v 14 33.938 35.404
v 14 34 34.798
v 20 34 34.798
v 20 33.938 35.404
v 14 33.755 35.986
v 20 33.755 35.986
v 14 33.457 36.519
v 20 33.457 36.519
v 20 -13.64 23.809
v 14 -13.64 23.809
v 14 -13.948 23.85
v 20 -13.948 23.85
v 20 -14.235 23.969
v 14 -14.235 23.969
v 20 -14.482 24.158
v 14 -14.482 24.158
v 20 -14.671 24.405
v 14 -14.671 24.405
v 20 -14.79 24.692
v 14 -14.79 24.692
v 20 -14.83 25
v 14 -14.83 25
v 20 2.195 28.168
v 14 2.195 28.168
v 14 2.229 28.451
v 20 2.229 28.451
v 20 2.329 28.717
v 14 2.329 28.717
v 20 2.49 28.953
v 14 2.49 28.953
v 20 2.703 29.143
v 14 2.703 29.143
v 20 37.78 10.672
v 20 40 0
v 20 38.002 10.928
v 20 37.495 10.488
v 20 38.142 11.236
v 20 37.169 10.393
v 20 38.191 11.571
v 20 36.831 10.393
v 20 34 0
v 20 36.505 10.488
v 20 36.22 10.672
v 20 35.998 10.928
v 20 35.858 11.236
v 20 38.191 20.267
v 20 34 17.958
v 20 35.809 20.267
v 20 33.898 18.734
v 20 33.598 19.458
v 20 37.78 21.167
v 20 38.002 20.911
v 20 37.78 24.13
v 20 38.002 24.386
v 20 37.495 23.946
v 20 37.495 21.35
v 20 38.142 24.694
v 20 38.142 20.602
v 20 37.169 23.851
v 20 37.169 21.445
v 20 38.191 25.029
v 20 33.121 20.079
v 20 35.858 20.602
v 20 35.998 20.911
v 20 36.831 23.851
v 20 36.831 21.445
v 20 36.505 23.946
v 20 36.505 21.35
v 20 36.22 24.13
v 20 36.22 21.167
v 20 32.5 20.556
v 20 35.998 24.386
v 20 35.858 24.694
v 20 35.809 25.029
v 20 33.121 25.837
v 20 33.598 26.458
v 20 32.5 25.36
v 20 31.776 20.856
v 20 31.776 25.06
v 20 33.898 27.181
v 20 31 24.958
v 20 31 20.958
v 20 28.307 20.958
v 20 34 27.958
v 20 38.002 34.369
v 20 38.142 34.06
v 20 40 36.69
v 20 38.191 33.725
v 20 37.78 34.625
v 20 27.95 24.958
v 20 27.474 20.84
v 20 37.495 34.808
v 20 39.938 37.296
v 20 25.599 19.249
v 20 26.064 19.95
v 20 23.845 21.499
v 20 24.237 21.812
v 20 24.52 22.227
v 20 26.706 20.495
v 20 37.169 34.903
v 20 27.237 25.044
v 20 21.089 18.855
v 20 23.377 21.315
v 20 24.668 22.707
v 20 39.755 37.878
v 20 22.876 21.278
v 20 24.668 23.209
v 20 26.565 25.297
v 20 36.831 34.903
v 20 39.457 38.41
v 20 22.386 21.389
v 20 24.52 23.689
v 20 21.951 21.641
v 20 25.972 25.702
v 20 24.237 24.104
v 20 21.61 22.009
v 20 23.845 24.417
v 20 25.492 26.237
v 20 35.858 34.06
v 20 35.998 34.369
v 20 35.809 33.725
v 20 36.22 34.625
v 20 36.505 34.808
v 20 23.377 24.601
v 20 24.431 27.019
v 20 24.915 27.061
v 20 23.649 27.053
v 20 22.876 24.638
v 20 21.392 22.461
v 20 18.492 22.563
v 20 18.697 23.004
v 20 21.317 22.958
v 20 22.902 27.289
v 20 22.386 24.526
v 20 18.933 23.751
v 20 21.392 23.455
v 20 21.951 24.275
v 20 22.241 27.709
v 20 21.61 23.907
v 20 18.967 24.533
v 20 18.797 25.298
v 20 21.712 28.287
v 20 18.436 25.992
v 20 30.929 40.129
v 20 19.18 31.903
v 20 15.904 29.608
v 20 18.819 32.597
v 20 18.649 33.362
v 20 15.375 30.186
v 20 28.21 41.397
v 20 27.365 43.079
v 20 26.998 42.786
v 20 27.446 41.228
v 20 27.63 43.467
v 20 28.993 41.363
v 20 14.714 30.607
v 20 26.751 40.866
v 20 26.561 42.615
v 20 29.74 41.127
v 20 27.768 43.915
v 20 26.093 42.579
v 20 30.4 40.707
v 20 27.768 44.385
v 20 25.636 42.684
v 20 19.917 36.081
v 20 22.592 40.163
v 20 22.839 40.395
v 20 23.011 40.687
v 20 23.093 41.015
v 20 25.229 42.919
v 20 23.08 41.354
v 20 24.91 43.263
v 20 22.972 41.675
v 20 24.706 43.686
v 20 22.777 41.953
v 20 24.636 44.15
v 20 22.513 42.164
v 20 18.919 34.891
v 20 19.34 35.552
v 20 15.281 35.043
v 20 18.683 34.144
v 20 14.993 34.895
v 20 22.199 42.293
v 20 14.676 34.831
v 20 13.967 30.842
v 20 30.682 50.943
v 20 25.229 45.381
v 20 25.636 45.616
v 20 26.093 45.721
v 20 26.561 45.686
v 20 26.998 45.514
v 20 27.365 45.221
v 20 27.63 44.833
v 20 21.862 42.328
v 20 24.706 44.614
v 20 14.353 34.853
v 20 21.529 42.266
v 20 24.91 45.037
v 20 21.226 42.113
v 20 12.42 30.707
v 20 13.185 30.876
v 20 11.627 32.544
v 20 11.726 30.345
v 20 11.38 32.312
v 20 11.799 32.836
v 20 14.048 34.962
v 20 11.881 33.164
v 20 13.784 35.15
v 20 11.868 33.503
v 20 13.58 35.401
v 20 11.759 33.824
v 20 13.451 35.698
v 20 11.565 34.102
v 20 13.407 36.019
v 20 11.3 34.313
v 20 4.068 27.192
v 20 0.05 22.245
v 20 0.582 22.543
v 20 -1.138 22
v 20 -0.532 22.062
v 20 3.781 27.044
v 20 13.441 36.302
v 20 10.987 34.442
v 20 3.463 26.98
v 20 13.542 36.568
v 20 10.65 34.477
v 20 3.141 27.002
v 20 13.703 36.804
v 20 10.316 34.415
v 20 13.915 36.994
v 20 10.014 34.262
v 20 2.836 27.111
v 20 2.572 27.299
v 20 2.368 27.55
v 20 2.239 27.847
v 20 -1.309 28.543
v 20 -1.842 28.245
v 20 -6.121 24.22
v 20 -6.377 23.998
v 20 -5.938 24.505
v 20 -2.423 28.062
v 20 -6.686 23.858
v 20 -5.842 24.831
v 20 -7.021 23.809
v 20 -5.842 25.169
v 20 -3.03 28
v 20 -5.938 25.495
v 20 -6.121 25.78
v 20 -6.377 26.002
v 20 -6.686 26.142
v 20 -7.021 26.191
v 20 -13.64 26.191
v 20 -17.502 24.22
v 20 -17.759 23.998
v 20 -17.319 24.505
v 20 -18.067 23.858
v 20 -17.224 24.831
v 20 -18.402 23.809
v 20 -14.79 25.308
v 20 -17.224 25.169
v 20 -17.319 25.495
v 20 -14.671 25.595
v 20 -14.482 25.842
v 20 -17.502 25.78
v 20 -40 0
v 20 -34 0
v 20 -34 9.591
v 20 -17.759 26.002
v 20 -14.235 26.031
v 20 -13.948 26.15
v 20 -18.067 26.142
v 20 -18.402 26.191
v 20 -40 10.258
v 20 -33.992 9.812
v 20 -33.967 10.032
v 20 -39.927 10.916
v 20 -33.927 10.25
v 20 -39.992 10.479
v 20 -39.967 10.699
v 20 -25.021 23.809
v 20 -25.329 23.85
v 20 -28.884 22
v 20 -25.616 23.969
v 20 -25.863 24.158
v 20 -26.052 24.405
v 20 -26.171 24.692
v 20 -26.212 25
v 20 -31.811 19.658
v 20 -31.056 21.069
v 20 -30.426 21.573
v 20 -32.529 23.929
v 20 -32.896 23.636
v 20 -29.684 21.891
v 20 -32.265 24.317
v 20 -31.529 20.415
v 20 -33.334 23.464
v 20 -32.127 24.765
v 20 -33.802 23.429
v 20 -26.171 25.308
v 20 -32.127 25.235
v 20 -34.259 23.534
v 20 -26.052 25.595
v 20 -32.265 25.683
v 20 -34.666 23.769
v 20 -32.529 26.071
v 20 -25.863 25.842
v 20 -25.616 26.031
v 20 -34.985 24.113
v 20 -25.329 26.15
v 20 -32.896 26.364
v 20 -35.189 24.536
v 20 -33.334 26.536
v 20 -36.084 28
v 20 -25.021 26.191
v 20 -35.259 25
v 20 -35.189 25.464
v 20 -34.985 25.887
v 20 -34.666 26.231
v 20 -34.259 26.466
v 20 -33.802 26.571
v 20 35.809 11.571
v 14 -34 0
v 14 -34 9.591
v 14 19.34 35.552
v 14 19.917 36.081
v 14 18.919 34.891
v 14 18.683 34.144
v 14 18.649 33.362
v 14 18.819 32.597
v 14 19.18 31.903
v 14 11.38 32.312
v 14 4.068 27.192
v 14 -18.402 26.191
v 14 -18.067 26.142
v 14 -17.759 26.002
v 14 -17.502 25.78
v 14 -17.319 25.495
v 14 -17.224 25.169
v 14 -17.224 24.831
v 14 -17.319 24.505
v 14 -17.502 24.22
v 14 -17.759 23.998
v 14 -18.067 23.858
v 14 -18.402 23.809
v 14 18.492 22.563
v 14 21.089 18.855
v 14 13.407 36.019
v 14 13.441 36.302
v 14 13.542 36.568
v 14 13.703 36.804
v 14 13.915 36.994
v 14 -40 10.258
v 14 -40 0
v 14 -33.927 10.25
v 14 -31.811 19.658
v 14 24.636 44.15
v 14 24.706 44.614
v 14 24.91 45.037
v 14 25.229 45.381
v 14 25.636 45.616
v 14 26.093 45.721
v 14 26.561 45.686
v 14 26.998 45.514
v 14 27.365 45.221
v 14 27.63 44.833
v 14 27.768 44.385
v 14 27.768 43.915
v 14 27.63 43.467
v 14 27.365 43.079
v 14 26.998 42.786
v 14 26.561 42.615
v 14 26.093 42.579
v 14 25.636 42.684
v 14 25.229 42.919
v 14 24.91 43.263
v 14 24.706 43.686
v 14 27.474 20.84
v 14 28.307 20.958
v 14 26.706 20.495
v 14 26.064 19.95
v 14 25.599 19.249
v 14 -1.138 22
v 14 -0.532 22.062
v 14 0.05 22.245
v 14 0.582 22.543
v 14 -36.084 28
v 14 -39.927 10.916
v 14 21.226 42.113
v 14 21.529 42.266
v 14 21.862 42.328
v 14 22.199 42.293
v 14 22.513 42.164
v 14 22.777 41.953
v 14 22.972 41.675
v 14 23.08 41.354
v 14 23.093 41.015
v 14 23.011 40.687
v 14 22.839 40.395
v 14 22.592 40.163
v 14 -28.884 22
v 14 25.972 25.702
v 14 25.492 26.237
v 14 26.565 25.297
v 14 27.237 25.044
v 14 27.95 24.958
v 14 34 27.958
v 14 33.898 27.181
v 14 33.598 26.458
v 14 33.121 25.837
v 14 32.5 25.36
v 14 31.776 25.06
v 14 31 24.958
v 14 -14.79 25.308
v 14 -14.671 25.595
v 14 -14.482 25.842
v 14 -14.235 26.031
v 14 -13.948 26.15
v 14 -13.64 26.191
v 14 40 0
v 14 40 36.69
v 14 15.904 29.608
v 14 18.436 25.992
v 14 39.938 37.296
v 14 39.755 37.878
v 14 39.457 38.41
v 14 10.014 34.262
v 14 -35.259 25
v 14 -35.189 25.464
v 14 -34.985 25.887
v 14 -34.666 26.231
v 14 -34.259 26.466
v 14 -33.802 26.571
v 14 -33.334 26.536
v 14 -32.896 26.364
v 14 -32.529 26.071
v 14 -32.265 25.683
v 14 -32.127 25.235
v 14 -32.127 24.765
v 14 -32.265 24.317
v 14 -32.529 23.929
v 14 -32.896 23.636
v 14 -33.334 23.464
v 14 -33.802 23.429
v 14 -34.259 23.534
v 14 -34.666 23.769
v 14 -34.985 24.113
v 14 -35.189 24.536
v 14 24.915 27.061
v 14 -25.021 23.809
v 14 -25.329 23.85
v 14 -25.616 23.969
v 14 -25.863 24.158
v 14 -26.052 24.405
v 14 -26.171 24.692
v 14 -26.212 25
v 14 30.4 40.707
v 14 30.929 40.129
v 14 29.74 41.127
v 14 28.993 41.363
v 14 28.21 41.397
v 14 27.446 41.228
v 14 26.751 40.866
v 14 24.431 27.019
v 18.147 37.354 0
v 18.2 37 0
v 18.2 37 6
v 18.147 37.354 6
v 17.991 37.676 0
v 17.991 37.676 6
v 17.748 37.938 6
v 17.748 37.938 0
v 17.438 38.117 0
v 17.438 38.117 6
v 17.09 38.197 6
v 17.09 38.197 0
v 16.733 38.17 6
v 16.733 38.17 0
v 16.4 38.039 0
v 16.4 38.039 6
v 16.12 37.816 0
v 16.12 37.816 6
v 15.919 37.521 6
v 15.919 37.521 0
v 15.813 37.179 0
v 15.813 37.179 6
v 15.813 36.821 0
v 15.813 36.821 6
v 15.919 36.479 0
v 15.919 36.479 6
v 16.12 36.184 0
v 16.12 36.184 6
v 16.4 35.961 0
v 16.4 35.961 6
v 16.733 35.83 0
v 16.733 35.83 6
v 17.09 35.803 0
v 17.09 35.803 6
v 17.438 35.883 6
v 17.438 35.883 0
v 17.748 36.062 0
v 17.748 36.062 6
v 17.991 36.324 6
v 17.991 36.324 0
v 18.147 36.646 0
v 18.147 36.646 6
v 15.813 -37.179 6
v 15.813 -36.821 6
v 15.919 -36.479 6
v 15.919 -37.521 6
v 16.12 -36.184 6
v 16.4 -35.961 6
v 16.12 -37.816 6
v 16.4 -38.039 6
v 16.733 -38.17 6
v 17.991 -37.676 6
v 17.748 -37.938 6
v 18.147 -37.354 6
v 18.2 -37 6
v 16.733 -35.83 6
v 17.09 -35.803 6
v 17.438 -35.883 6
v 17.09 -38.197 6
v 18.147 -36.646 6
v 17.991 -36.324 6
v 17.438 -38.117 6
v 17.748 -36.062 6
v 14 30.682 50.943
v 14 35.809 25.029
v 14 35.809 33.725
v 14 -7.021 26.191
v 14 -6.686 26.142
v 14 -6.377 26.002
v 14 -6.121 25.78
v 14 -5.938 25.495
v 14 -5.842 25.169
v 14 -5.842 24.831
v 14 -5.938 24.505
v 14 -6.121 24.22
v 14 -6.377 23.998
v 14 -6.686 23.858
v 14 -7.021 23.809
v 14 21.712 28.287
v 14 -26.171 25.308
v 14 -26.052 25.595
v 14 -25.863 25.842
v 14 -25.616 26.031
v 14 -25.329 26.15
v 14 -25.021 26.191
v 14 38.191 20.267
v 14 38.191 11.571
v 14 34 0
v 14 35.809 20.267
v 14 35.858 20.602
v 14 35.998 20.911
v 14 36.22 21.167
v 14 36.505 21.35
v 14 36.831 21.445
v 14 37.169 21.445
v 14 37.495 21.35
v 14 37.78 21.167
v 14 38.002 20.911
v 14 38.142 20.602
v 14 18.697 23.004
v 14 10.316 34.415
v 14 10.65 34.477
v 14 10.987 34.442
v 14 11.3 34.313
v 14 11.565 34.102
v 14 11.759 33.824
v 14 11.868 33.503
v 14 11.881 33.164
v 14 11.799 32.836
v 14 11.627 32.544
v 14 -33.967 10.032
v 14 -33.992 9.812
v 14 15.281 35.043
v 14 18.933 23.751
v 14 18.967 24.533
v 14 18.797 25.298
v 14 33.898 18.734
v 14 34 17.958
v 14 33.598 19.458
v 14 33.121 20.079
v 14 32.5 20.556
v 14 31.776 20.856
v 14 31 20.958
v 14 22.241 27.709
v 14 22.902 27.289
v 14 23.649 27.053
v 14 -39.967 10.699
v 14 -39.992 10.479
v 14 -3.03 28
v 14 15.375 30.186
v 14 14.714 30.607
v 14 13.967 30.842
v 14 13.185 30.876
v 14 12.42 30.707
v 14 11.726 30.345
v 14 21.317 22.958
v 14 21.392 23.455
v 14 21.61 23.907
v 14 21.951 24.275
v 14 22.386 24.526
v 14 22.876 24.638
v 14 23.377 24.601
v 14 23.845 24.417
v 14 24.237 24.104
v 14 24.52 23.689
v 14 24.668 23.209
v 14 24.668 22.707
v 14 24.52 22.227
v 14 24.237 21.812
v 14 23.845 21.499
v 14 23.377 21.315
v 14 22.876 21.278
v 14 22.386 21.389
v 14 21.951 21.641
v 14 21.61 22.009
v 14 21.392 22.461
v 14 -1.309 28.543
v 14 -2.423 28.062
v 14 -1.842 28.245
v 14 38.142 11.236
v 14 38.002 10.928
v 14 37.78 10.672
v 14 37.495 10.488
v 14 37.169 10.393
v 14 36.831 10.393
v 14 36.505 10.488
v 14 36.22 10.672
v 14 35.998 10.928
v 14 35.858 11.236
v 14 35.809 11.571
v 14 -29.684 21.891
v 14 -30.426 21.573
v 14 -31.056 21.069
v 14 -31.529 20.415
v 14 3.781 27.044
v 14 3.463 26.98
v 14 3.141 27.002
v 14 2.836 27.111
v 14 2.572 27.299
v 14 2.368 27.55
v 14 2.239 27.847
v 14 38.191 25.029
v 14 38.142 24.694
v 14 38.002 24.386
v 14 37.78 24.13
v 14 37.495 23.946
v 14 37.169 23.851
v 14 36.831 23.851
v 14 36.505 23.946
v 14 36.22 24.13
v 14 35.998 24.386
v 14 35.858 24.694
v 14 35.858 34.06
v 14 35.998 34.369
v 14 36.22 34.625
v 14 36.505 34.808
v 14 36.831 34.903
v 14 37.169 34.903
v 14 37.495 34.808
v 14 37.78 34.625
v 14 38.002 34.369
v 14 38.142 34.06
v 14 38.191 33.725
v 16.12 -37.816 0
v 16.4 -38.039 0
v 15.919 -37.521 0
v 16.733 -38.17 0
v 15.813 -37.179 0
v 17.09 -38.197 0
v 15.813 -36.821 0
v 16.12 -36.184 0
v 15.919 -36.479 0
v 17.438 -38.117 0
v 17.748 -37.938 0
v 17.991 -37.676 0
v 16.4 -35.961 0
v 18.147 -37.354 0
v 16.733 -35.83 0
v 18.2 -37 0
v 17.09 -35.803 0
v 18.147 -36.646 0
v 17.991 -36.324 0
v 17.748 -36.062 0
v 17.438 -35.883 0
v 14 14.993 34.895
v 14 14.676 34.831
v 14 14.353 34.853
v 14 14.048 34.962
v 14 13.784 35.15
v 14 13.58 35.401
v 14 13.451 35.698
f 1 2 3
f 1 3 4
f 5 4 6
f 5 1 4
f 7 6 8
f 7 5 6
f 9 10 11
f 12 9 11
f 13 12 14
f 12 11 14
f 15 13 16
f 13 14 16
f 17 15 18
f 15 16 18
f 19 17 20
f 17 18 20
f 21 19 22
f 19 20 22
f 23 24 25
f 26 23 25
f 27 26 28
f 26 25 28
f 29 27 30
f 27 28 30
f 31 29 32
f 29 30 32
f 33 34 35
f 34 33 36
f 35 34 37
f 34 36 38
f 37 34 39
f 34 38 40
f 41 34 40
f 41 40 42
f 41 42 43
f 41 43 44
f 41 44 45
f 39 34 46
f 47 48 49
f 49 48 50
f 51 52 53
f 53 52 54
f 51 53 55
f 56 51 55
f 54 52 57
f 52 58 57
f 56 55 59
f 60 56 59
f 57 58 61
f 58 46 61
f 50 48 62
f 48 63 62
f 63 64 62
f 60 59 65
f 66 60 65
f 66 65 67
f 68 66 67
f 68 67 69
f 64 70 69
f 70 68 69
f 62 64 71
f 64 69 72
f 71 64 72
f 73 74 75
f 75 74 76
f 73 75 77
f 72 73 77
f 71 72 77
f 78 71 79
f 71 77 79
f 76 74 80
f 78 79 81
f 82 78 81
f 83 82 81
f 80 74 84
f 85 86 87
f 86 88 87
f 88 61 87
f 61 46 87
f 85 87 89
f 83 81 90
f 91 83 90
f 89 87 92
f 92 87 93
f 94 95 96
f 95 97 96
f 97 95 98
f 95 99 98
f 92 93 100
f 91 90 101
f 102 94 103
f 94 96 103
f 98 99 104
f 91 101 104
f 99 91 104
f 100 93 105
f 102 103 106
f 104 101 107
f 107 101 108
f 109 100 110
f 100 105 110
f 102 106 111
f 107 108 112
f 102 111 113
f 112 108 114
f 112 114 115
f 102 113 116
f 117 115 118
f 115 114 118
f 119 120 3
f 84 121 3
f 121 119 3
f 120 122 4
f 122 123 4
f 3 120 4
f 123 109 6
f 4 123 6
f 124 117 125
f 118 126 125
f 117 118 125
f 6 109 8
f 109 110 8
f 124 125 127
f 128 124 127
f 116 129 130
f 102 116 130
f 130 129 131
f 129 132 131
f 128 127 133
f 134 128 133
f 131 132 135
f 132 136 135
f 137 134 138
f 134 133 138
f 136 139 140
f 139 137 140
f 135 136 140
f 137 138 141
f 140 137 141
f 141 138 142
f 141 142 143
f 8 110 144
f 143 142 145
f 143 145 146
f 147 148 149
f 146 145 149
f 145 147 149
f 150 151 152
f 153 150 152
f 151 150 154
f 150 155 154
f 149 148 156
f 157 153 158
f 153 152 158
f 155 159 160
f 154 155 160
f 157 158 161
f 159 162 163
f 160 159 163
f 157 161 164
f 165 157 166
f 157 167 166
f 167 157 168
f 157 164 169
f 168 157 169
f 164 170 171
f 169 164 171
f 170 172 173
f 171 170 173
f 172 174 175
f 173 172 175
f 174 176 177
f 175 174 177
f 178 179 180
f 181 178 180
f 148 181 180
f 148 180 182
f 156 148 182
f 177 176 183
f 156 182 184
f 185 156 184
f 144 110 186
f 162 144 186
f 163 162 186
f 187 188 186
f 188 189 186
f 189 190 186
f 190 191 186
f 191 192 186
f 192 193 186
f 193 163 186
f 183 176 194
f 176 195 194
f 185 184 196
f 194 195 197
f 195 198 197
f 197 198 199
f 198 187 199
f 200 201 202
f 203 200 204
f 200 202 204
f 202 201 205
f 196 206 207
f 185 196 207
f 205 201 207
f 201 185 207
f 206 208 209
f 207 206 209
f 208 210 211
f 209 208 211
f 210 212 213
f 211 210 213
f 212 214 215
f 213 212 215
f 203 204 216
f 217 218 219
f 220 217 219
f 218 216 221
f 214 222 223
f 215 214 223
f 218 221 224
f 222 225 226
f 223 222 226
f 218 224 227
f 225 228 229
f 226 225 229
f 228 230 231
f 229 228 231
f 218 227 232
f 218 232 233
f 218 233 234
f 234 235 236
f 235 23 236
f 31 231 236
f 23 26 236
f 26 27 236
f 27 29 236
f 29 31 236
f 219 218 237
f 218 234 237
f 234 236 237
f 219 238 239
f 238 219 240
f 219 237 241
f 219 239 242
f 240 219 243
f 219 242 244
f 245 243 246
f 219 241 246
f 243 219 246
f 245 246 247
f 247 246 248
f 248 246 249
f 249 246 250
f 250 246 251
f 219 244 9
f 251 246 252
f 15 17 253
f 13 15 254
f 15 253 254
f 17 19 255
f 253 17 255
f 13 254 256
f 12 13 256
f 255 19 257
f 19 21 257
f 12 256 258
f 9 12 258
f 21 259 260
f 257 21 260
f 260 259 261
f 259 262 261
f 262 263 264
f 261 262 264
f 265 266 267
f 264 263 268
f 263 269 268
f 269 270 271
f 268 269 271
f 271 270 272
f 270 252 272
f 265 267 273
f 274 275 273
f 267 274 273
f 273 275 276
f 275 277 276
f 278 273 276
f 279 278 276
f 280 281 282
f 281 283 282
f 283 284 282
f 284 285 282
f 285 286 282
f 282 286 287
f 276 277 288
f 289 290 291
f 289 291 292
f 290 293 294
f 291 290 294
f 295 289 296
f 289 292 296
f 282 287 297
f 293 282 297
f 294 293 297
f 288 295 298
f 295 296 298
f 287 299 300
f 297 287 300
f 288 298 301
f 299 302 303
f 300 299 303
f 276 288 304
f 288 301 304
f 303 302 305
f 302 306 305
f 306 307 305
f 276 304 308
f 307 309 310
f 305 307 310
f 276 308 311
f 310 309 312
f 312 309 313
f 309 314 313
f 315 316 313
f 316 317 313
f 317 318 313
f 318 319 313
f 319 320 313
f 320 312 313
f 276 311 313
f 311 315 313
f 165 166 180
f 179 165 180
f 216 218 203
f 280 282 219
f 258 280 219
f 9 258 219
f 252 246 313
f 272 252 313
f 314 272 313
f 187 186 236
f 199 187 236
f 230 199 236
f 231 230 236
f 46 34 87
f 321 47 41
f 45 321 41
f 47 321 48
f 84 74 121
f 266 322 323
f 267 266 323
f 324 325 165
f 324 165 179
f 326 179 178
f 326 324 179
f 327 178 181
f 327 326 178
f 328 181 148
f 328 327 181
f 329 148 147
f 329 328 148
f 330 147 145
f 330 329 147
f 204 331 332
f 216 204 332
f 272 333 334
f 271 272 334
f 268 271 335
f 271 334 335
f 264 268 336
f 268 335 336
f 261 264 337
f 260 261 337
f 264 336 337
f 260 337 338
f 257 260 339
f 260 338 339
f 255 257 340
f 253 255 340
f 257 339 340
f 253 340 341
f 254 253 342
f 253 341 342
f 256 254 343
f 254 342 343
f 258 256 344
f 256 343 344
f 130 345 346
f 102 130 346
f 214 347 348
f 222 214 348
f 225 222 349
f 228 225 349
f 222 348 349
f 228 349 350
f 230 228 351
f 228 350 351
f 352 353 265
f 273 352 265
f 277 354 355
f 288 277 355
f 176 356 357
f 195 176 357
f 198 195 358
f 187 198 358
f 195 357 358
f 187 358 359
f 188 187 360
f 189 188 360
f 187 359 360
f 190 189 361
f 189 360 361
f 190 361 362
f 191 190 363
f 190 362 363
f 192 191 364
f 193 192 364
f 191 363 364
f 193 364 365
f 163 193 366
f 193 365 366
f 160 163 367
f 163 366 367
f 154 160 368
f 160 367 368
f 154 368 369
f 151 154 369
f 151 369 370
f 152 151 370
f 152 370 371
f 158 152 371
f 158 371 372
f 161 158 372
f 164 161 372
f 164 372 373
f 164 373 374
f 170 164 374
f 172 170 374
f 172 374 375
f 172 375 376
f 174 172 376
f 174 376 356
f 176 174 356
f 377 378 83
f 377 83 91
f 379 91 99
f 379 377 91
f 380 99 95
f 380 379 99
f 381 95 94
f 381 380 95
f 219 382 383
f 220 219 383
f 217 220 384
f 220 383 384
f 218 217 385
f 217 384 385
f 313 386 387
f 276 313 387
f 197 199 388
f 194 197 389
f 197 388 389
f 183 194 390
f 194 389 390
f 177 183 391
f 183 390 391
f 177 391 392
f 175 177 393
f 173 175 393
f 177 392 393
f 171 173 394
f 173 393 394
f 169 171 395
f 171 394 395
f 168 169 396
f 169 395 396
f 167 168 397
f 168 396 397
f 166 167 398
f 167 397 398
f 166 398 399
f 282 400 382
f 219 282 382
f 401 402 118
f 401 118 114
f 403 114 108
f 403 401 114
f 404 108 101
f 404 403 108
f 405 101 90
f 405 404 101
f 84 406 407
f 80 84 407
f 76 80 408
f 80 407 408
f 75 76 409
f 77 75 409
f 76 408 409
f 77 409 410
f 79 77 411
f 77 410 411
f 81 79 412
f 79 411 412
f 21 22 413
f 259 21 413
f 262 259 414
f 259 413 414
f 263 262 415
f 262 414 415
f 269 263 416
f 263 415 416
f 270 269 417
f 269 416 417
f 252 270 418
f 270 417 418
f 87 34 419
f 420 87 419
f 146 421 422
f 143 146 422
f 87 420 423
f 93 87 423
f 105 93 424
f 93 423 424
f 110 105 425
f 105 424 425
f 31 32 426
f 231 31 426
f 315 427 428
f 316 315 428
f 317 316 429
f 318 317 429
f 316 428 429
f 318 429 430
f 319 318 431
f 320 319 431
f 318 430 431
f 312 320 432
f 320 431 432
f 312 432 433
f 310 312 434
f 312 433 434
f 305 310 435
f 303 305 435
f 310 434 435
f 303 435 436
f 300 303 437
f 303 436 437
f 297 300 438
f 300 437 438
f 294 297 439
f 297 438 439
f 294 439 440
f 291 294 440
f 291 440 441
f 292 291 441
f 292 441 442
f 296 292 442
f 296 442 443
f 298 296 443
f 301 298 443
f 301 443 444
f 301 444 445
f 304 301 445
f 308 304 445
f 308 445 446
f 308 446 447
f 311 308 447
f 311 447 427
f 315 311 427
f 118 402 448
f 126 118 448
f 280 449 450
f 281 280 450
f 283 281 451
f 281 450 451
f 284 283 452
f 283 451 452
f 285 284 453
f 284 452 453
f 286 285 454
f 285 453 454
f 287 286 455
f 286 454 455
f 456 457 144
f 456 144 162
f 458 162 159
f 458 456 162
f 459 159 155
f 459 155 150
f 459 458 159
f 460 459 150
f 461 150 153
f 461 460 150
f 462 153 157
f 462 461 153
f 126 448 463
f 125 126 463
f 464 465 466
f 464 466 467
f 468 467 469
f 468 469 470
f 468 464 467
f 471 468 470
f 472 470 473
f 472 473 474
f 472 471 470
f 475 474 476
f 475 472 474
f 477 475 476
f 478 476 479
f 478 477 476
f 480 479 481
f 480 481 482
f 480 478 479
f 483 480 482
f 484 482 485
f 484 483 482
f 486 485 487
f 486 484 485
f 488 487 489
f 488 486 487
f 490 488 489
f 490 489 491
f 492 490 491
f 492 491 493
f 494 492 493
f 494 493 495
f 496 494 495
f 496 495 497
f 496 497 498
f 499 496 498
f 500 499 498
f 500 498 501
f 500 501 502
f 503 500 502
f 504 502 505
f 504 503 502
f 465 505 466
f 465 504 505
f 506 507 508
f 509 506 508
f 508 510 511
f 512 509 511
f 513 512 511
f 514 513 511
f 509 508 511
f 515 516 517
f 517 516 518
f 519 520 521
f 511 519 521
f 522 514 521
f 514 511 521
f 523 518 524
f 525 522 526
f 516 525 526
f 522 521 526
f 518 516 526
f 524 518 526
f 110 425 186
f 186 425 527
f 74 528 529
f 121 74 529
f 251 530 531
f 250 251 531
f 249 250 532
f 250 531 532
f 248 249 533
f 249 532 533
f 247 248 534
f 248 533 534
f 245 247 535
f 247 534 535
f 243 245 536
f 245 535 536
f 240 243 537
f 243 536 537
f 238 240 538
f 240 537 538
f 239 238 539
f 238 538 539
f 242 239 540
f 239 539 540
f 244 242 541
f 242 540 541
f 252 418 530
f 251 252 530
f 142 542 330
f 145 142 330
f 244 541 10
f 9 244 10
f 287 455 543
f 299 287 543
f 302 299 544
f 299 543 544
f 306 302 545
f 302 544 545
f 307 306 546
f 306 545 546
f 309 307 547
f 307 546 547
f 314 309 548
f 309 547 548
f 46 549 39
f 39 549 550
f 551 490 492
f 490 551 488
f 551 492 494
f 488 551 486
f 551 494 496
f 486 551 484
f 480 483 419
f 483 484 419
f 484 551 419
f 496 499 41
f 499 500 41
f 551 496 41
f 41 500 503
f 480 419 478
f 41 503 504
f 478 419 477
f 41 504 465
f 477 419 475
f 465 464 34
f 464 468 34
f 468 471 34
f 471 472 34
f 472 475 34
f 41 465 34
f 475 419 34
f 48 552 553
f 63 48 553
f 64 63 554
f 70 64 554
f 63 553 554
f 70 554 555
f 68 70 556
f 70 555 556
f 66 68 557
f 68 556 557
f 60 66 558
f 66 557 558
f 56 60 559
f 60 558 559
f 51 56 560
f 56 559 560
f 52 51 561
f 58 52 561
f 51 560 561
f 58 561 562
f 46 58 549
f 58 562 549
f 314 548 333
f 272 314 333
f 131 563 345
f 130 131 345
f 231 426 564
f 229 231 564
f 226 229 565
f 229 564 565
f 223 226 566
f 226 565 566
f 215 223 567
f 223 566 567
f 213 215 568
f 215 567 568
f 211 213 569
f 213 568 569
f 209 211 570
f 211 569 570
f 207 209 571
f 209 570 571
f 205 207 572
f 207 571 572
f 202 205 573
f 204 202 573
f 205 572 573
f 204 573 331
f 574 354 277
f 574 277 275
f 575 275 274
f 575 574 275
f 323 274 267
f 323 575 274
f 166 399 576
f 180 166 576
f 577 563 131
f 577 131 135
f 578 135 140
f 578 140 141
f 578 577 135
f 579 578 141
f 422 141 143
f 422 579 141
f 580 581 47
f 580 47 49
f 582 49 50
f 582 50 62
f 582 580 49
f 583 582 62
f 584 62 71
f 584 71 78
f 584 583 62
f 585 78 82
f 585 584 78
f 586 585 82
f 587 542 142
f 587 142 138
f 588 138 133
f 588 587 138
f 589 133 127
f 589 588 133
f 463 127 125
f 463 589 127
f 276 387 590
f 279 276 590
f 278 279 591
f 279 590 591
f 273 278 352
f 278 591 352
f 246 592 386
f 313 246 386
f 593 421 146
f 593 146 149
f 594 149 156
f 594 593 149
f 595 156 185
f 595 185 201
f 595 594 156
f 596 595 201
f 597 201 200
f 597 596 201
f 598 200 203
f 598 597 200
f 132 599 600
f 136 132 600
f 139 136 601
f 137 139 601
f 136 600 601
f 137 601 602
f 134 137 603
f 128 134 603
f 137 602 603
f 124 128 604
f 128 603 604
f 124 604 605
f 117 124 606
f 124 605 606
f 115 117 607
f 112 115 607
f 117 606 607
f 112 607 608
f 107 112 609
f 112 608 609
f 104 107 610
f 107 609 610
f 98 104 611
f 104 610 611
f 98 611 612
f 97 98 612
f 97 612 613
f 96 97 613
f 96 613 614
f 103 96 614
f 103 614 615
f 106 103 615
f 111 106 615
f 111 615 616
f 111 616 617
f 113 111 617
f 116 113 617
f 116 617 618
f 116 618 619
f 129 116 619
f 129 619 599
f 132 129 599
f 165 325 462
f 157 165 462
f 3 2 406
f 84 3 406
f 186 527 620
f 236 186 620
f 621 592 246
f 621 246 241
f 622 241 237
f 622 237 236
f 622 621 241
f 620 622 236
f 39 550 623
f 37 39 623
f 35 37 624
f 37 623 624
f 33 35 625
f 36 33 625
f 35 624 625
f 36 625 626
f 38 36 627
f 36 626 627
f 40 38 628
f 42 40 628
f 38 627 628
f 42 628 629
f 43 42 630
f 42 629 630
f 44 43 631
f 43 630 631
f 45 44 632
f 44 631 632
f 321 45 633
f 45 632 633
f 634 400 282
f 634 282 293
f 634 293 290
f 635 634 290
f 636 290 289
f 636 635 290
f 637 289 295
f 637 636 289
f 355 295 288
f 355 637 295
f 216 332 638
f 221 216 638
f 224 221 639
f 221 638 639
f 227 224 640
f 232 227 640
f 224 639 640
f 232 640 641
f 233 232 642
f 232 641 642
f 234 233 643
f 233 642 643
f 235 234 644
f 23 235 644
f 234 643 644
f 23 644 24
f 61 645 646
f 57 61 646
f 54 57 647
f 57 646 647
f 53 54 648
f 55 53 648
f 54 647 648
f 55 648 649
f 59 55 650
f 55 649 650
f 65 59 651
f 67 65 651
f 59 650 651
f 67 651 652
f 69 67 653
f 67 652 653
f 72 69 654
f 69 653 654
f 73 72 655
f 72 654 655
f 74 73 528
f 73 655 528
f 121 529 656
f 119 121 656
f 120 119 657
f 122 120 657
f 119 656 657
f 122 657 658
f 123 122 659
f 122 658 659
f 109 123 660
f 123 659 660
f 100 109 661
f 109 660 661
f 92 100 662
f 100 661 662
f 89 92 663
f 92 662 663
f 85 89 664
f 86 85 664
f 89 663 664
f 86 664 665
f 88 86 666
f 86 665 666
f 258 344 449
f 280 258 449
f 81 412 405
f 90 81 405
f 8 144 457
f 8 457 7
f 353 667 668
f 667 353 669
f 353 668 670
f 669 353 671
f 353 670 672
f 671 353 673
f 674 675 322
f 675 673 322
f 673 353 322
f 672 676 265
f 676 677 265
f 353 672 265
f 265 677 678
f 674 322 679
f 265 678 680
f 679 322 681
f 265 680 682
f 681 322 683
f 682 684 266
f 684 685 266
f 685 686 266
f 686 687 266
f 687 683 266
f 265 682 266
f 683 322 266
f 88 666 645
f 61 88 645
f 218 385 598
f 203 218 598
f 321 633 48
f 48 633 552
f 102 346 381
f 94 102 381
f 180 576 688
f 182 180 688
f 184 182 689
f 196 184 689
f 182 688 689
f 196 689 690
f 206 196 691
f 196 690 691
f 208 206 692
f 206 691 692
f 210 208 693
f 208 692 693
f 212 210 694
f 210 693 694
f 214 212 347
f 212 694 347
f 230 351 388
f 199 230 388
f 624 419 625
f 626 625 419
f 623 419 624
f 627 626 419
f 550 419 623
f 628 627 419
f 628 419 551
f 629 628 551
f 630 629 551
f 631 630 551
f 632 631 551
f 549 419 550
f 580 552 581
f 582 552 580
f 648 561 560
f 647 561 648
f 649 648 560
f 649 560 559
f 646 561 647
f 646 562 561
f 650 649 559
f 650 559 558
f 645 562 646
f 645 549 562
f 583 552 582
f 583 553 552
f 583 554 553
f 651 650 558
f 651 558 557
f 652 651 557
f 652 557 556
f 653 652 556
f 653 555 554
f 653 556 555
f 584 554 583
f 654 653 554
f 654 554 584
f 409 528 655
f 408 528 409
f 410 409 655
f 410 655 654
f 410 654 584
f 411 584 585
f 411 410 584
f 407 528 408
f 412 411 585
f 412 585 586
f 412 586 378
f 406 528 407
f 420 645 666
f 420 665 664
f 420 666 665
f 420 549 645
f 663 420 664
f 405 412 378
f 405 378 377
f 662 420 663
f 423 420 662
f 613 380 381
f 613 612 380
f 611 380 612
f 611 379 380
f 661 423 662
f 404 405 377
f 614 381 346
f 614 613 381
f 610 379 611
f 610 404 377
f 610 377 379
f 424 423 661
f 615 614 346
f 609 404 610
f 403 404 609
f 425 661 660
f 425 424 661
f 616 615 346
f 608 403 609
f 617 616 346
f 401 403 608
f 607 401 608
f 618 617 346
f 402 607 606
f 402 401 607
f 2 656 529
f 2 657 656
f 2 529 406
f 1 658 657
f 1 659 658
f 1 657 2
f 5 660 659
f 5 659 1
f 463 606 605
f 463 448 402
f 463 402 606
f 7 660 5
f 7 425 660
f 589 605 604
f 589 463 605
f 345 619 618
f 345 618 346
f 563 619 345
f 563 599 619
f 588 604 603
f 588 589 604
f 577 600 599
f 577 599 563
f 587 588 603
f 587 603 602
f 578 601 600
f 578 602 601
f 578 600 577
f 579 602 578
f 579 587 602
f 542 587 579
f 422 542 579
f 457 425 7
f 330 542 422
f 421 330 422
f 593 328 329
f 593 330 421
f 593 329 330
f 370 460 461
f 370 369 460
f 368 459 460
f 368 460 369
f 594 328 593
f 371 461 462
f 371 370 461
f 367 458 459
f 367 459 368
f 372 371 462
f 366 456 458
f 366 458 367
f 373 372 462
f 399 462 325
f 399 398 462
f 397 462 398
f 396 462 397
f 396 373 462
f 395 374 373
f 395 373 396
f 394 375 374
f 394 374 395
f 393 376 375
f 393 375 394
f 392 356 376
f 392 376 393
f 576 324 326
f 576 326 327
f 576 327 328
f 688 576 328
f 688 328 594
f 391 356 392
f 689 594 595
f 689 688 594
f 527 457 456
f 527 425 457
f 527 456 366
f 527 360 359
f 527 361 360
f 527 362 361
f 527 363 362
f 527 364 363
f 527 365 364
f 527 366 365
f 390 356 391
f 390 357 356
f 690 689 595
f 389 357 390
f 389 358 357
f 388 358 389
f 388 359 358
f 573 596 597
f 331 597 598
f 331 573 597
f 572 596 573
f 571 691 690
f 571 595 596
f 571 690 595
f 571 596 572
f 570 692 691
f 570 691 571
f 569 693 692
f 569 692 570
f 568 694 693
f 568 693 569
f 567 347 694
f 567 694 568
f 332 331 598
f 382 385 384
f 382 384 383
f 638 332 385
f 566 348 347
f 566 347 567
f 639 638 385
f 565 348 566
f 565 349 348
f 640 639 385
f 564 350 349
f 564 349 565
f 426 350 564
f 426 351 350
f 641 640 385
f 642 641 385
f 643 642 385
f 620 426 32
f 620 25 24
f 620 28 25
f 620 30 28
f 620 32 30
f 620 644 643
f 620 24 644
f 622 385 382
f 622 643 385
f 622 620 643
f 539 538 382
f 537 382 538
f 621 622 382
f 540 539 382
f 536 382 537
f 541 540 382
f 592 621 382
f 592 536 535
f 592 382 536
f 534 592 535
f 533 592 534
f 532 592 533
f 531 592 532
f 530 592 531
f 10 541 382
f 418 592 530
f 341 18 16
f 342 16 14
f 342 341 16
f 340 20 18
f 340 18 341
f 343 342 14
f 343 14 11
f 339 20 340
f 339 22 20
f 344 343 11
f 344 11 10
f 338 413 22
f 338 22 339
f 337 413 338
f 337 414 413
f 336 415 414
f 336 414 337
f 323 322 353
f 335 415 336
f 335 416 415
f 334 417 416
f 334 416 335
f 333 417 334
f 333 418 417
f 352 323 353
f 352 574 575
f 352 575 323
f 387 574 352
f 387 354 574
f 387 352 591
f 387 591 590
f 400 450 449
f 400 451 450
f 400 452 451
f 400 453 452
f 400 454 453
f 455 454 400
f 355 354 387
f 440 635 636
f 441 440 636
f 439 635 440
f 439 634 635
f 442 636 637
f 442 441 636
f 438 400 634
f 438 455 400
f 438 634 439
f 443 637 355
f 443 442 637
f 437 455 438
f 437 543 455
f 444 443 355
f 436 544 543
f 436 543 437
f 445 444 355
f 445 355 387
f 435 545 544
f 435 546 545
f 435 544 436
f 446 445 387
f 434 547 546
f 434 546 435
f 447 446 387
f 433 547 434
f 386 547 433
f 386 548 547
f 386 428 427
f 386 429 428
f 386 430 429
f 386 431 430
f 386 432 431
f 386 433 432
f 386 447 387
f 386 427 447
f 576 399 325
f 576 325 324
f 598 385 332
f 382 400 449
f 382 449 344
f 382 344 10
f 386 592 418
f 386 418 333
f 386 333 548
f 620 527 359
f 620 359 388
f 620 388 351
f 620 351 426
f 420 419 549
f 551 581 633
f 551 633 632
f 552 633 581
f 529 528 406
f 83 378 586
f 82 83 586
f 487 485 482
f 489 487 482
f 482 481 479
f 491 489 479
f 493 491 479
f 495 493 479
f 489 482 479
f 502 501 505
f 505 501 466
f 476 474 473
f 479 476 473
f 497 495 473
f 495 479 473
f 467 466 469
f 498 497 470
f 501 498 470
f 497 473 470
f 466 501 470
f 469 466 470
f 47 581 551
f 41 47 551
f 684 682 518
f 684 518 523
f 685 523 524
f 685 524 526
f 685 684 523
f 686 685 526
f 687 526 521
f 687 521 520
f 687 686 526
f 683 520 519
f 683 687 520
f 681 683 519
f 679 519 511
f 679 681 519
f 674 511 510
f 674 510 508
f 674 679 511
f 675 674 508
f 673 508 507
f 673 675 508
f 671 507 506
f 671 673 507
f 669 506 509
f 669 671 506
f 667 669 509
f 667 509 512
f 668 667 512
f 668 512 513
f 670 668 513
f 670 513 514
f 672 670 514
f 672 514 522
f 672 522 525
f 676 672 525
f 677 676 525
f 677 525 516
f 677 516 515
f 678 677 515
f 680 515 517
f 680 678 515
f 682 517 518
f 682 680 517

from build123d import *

# Parameters (mm, degrees)
F1_DEPTH     = 70
F2_R         = 1.685
F2_R_2       = 1.575
F3_DEPTH     = 25
F4_R         = 1.2
F5_DEPTH     = 6
F6_T1_DEPTH  = 6
F6_T6_DEPTH  = 6
F6_T8_DEPTH  = 10.7294818332
F6_T10_DEPTH = 7.6661885506


# Not quite as in the source:
# - a fillet or chamfer that OpenCascade refuses, or shapes differently, is made with other operations: its cross-section is extruded or revolved along the edge and cut away or added
# - a feature names something its author has since deleted; it is built from what else it names


with BuildPart() as f1:
    # F0 (on Top) → F1 (new body)
    with BuildSketch(Plane.XY):
        Polygon((20, 40), (14, 40), (14, 0), (14, -40), (20, -40), (20, 0), align=None)
    extrude(amount=F1_DEPTH)

    # F2 (on face) → F3 (cut)
    with BuildSketch(Plane(origin=(14, 0, 0), x_dir=(0, -1, 0), z_dir=(-1, 0, 0))):
        Polygon((-30.6819530985, 50.943057454), (2.084128673, 28), (36.084128673, 28), (40, 10.5910085265), (40, 70), (-40, 70), (-40, 37.635507345), align=None)
        Polygon((-34, 20.9578964859), (-34, 0), (34, 0), (34, 9.9245331063), (31.2838188449, 22), (0.1923359398, 22), (-14.1830926793, 32.0657834841), (-19.4291743712, 24.5736023727), (-18.4917532979, 22.5632963938), (-21.0886368482, 18.8545623277), (-25.5989365404, 19.2491624199), (-26.3957323212, 20.9578964859), align=None)
        Polygon((-34, 24.9578964859), (-26.3882395651, 24.9578964859), (-24.9154691321, 27.0612306442), (-22.7057825483, 26.8679081181), (-17.4597008565, 34.3600892295), (-29.2084994509, 42.5866865702), (-34, 35.7437146117), align=None)
        with Locations((-23.0020529902, 22.9578964859)):
            Circle(F2_R)
        with Locations((-26.2109216504, 44.1500837642)):
            Circle(F2_R_2)
        with Locations((33.683973759, 25)):
            Circle(F2_R_2)
        with BuildLine():
            Line((13.6397417612, 26.190625), (7.0209917612, 26.190625))
            ThreePointArc((7.0209917612, 26.190625), (7.8628907726, 25.8418990114), (8.2116167612, 25))
            ThreePointArc((8.2116167612, 25), (7.8628907726, 24.1581009886), (7.0209917612, 23.809375))
            Line((7.0209917612, 23.809375), (13.6397417612, 23.809375))
            ThreePointArc((13.6397417612, 23.809375), (12.4491167612, 25), (13.6397417612, 26.190625))
        make_face()
        with BuildLine():
            ThreePointArc((8.2116167612, 25), (7.8628907726, 25.8418990114), (7.0209917612, 26.190625))
            ThreePointArc((7.0209917612, 26.190625), (5.8303667612, 25), (7.0209917612, 23.809375))
            ThreePointArc((7.0209917612, 23.809375), (7.8628907726, 24.1581009886), (8.2116167612, 25))
        make_face()
        with BuildLine():
            ThreePointArc((14.8303667612, 25), (14.4816407726, 25.8418990114), (13.6397417612, 26.190625))
            ThreePointArc((13.6397417612, 26.190625), (12.4491167612, 25), (13.6397417612, 23.809375))
            ThreePointArc((13.6397417612, 23.809375), (14.4816407726, 24.1581009886), (14.8303667612, 25))
        make_face()
        with BuildLine():
            ThreePointArc((25.0209917612, 23.809375), (25.8628907726, 24.1581009886), (26.2116167612, 25))
            ThreePointArc((26.2116167612, 25), (25.8628907726, 25.8418990114), (25.0209917612, 26.190625))
            ThreePointArc((25.0209917612, 26.190625), (23.8303667612, 25), (25.0209917612, 23.809375))
        make_face()
        with BuildLine():
            ThreePointArc((25.0209917612, 23.809375), (23.8303667612, 25), (25.0209917612, 26.190625))
            Line((25.0209917612, 26.190625), (18.4022417612, 26.190625))
            ThreePointArc((18.4022417612, 26.190625), (19.2441407726, 25.8418990114), (19.5928667612, 25))
            ThreePointArc((19.5928667612, 25), (19.2441407726, 24.1581009886), (18.4022417612, 23.809375))
            Line((18.4022417612, 23.809375), (25.0209917612, 23.809375))
        make_face()
        with BuildLine():
            ThreePointArc((19.5928667612, 25), (19.2441407726, 25.8418990114), (18.4022417612, 26.190625))
            ThreePointArc((18.4022417612, 26.190625), (17.2116167612, 25), (18.4022417612, 23.809375))
            ThreePointArc((18.4022417612, 23.809375), (19.2441407726, 24.1581009886), (19.5928667612, 25))
        make_face()
        with BuildLine():
            ThreePointArc((-38.190625, 33.7249029726), (-37, 32.5342779726), (-35.809375, 33.7249029726))
            ThreePointArc((-35.809375, 33.7249029726), (-37, 34.9155279726), (-38.190625, 33.7249029726))
        make_face()
        with BuildLine():
            Line((-35.809375, 25.0294377416), (-35.809375, 33.7249029726))
            ThreePointArc((-35.809375, 33.7249029726), (-37, 32.5342779726), (-38.190625, 33.7249029726))
            Line((-38.190625, 33.7249029726), (-38.190625, 25.0294377416))
            ThreePointArc((-38.190625, 25.0294377416), (-37, 26.2200627416), (-35.809375, 25.0294377416))
        make_face()
        with BuildLine():
            ThreePointArc((-38.190625, 25.0294377416), (-37, 23.8388127416), (-35.809375, 25.0294377416))
            ThreePointArc((-35.809375, 25.0294377416), (-37, 26.2200627416), (-38.190625, 25.0294377416))
        make_face()
        with BuildLine():
            ThreePointArc((-38.190625, 11.5714725107), (-37, 10.3808475107), (-35.809375, 11.5714725107))
            ThreePointArc((-35.809375, 11.5714725107), (-37, 12.7620975107), (-38.190625, 11.5714725107))
        make_face()
        with BuildLine():
            ThreePointArc((-38.190625, 11.5714725107), (-37, 12.7620975107), (-35.809375, 11.5714725107))
            Line((-35.809375, 11.5714725107), (-35.809375, 20.2669377416))
            ThreePointArc((-35.809375, 20.2669377416), (-37, 19.0763127416), (-38.190625, 20.2669377416))
            Line((-38.190625, 20.2669377416), (-38.190625, 11.5714725107))
        make_face()
        with BuildLine():
            ThreePointArc((-38.190625, 20.2669377416), (-37, 19.0763127416), (-35.809375, 20.2669377416))
            ThreePointArc((-35.809375, 20.2669377416), (-37, 21.4575627416), (-38.190625, 20.2669377416))
        make_face()
        with BuildLine():
            ThreePointArc((-20.7184760846, 41.137916576), (-21.359331642, 40.0818193028), (-22.5920155292, 40.1626136733))
            Line((-22.5920155292, 40.1626136733), (-15.2808470158, 35.0432783671))
            ThreePointArc((-15.2808470158, 35.0432783671), (-15.573235474, 36.7014957144), (-13.9150181268, 36.9938841726))
            Line((-13.9150181268, 36.9938841726), (-21.2261866401, 42.1132194788))
            ThreePointArc((-21.2261866401, 42.1132194788), (-20.8530038114, 41.6876860187), (-20.7184760846, 41.137916576))
        make_face()
        with BuildLine():
            ThreePointArc((-21.2261866401, 42.1132194788), (-22.8844039874, 41.8208310206), (-22.5920155292, 40.1626136733))
            ThreePointArc((-22.5920155292, 40.1626136733), (-21.359331642, 40.0818193028), (-20.7184760846, 41.137916576))
            ThreePointArc((-20.7184760846, 41.137916576), (-20.8530038114, 41.6876860187), (-21.2261866401, 42.1132194788))
        make_face()
        with BuildLine():
            ThreePointArc((-13.9150181268, 36.9938841726), (-15.573235474, 36.7014957144), (-15.2808470158, 35.0432783671))
            ThreePointArc((-15.2808470158, 35.0432783671), (-14.0481631287, 34.9624839966), (-13.4073075713, 36.0185812699))
            ThreePointArc((-13.4073075713, 36.0185812699), (-13.541835298, 36.5683507125), (-13.9150181268, 36.9938841726))
        make_face()
        with BuildLine():
            ThreePointArc((-4.0684668916, 27.1922852829), (-2.8357830044, 27.1114909123), (-2.194927447, 28.1675881856))
            ThreePointArc((-2.194927447, 28.1675881856), (-2.3294551738, 28.7173576282), (-2.7026380025, 29.1428910883))
            ThreePointArc((-2.7026380025, 29.1428910883), (-4.3608553498, 28.8505026301), (-4.0684668916, 27.1922852829))
        make_face()
        with BuildLine():
            ThreePointArc((-4.0684668916, 27.1922852829), (-4.3608553498, 28.8505026301), (-2.7026380025, 29.1428910883))
            Line((-2.7026380025, 29.1428910883), (-10.0138065158, 34.2622263945))
            ThreePointArc((-10.0138065158, 34.2622263945), (-9.6406236871, 33.8366929344), (-9.5060959604, 33.2869234917))
            ThreePointArc((-9.5060959604, 33.2869234917), (-10.1469515177, 32.2308262185), (-11.3796354049, 32.311620589))
            Line((-11.3796354049, 32.311620589), (-4.0684668916, 27.1922852829))
        make_face()
        with BuildLine():
            ThreePointArc((-9.5060959604, 33.2869234917), (-9.6406236871, 33.8366929344), (-10.0138065158, 34.2622263945))
            ThreePointArc((-10.0138065158, 34.2622263945), (-11.6720238631, 33.9698379363), (-11.3796354049, 32.311620589))
            ThreePointArc((-11.3796354049, 32.311620589), (-10.1469515177, 32.2308262185), (-9.5060959604, 33.2869234917))
        make_face()
    extrude(amount=-F3_DEPTH, mode=Mode.SUBTRACT)

    # F4 (on face) → F5 (cut)
    with BuildSketch(Plane.XY):
        with Locations((17, 37)):
            Circle(F4_R)
        with Locations((17, -37)):
            Circle(F4_R)
    extrude(amount=F5_DEPTH, mode=Mode.SUBTRACT)

    # F6: fillet of radius 3 on 16 edges, made by hand

    # F6_s2 → F6_t1 (join)
    with BuildSketch(Plane.YZ.offset(14)):
        with BuildLine():
            ThreePointArc((21.7123190185, 28.286721078), (22.9019203662, 27.2885270259), (24.4312423796, 27.0188662927))
            Line((24.4312423796, 27.0188662927), (22.7057825483, 26.8679081181))
            Line((22.7057825483, 26.8679081181), (21.7123190185, 28.286721078))
        make_face()
        with BuildLine():
            ThreePointArc((25.4924845839, 26.2371671769), (26.564694877, 25.2968639864), (27.9499407167, 24.9578964859))
            Line((27.9499407167, 24.9578964859), (26.3882395651, 24.9578964859))
            Line((26.3882395651, 24.9578964859), (25.4924845839, 26.2371671769))
        make_face()
        with BuildLine():
            ThreePointArc((34, 27.9578964859), (33.1213203436, 25.8365761424), (31, 24.9578964859))
            Line((31, 24.9578964859), (34, 24.9578964859))
            Line((34, 24.9578964859), (34, 27.9578964859))
        make_face()
        with BuildLine():
            ThreePointArc((34, 34.7978182451), (33.8611508522, 35.6999356436), (33.4574561329, 36.5185475541))
            Line((33.4574561329, 36.5185475541), (34, 35.7437146117))
            Line((34, 35.7437146117), (34, 34.7978182451))
        make_face()
        with BuildLine():
            ThreePointArc((30.92922876, 40.1292304373), (28.9927171601, 41.3629243873), (26.751043318, 40.8659572611))
            Line((26.751043318, 40.8659572611), (29.2084994509, 42.5866865702))
            Line((29.2084994509, 42.5866865702), (30.92922876, 40.1292304373))
        make_face()
        with BuildLine():
            ThreePointArc((19.9171569894, 36.0808185386), (18.6834630394, 34.1443069387), (19.1804301656, 31.9026330966))
            Line((19.1804301656, 31.9026330966), (17.4597008565, 34.3600892295))
            Line((17.4597008565, 34.3600892295), (19.9171569894, 36.0808185386))
        make_face()
        with BuildLine():
            ThreePointArc((15.9038219884, 29.6083273512), (13.9673103885, 30.8420213012), (11.7256365465, 30.345054175))
            Line((11.7256365465, 30.345054175), (14.1830926793, 32.0657834841))
            Line((14.1830926793, 32.0657834841), (15.9038219884, 29.6083273512))
        make_face()
        with BuildLine():
            ThreePointArc((18.6971780696, 23.0038312383), (18.9668388028, 24.5331532517), (18.4357108414, 25.9924153326))
            Line((18.4357108414, 25.9924153326), (19.4291743712, 24.5736023727))
            Line((19.4291743712, 24.5736023727), (18.6971780696, 23.0038312383))
        make_face()
        with BuildLine():
            ThreePointArc((34, 17.9578964859), (33.1213203436, 20.0792168295), (31, 20.9578964859))
            Line((31, 20.9578964859), (34, 20.9578964859))
            Line((34, 20.9578964859), (34, 17.9578964859))
        make_face()
        with BuildLine():
            ThreePointArc((-28.8836639309, 22), (-30.7578228315, 21.3425474201), (-31.8105346625, 19.6583522769))
            Line((-31.8105346625, 19.6583522769), (-31.2838188449, 22))
            Line((-31.2838188449, 22), (-28.8836639309, 22))
        make_face()
        with BuildLine():
            ThreePointArc((-33.9268707316, 10.2496476731), (-33.9816616336, 9.9224960945), (-34, 9.5912953961))
            Line((-34, 9.5912953961), (-34, 9.9245331063))
            Line((-34, 9.9245331063), (-33.9268707316, 10.2496476731))
        make_face()
        with BuildLine():
            ThreePointArc((-3.0300250397, 28), (-2.1279076412, 28.1388491478), (-1.3092957306, 28.5425438671))
            Line((-1.3092957306, 28.5425438671), (-2.084128673, 28))
            Line((-2.084128673, 28), (-3.0300250397, 28))
        make_face()
    extrude(amount=F6_T1_DEPTH)


with BuildPart() as f6_tool4:
    # F6_s5 → F6_t6 (new body)
    with BuildSketch(Plane.YZ.offset(14)):
        with BuildLine():
            ThreePointArc((28.3069431036, 20.9578964859), (26.6950442786, 20.4880708234), (25.5880197425, 19.2257512711))
            Line((25.5880197425, 19.2257512711), (26.3957323212, 20.9578964859))
            Line((26.3957323212, 20.9578964859), (28.3069431036, 20.9578964859))
        make_face()
    extrude(amount=F6_T6_DEPTH)

    split(bisect_by=Plane(origin=(0, -1.4768383046, 16.8803390647), x_dir=(1, 0, 0), z_dir=(0, -0.0871557427, 0.9961946981)), keep=Keep.TOP)


with BuildPart() as f1_1:
    add(f1.part)

    # F6_t3: union F6_tool4
    add(f6_tool4.part)

    # F6_s9 → F6_t8 (cut)
    with BuildSketch(Plane.YZ.offset(11.6352590834)):
        with BuildLine():
            ThreePointArc((40, 36.6896109783), (39.8611508522, 37.5917283768), (39.4574561329, 38.4103402874))
            Line((39.4574561329, 38.4103402874), (40, 37.635507345))
            Line((40, 37.635507345), (40, 36.6896109783))
        make_face()
        with BuildLine():
            ThreePointArc((-1.1382323064, 22), (-0.2361149079, 22.1388491478), (0.5824970027, 22.5425438671))
            Line((0.5824970027, 22.5425438671), (-0.1923359398, 22))
            Line((-0.1923359398, 22), (-1.1382323064, 22))
        make_face()
    extrude(amount=F6_T8_DEPTH, mode=Mode.SUBTRACT)

    # F6_s11 → F6_t10 (cut)
    with BuildSketch(Plane.YZ.offset(13.1669057247)):
        with BuildLine():
            ThreePointArc((-39.9268707316, 10.9161230933), (-39.9816616336, 10.5889715148), (-40, 10.2577708164))
            Line((-40, 10.2577708164), (-40, 10.5910085265))
            Line((-40, 10.5910085265), (-39.9268707316, 10.9161230933))
        make_face()
    extrude(amount=F6_T10_DEPTH, mode=Mode.SUBTRACT)


solid = f1_1.part
